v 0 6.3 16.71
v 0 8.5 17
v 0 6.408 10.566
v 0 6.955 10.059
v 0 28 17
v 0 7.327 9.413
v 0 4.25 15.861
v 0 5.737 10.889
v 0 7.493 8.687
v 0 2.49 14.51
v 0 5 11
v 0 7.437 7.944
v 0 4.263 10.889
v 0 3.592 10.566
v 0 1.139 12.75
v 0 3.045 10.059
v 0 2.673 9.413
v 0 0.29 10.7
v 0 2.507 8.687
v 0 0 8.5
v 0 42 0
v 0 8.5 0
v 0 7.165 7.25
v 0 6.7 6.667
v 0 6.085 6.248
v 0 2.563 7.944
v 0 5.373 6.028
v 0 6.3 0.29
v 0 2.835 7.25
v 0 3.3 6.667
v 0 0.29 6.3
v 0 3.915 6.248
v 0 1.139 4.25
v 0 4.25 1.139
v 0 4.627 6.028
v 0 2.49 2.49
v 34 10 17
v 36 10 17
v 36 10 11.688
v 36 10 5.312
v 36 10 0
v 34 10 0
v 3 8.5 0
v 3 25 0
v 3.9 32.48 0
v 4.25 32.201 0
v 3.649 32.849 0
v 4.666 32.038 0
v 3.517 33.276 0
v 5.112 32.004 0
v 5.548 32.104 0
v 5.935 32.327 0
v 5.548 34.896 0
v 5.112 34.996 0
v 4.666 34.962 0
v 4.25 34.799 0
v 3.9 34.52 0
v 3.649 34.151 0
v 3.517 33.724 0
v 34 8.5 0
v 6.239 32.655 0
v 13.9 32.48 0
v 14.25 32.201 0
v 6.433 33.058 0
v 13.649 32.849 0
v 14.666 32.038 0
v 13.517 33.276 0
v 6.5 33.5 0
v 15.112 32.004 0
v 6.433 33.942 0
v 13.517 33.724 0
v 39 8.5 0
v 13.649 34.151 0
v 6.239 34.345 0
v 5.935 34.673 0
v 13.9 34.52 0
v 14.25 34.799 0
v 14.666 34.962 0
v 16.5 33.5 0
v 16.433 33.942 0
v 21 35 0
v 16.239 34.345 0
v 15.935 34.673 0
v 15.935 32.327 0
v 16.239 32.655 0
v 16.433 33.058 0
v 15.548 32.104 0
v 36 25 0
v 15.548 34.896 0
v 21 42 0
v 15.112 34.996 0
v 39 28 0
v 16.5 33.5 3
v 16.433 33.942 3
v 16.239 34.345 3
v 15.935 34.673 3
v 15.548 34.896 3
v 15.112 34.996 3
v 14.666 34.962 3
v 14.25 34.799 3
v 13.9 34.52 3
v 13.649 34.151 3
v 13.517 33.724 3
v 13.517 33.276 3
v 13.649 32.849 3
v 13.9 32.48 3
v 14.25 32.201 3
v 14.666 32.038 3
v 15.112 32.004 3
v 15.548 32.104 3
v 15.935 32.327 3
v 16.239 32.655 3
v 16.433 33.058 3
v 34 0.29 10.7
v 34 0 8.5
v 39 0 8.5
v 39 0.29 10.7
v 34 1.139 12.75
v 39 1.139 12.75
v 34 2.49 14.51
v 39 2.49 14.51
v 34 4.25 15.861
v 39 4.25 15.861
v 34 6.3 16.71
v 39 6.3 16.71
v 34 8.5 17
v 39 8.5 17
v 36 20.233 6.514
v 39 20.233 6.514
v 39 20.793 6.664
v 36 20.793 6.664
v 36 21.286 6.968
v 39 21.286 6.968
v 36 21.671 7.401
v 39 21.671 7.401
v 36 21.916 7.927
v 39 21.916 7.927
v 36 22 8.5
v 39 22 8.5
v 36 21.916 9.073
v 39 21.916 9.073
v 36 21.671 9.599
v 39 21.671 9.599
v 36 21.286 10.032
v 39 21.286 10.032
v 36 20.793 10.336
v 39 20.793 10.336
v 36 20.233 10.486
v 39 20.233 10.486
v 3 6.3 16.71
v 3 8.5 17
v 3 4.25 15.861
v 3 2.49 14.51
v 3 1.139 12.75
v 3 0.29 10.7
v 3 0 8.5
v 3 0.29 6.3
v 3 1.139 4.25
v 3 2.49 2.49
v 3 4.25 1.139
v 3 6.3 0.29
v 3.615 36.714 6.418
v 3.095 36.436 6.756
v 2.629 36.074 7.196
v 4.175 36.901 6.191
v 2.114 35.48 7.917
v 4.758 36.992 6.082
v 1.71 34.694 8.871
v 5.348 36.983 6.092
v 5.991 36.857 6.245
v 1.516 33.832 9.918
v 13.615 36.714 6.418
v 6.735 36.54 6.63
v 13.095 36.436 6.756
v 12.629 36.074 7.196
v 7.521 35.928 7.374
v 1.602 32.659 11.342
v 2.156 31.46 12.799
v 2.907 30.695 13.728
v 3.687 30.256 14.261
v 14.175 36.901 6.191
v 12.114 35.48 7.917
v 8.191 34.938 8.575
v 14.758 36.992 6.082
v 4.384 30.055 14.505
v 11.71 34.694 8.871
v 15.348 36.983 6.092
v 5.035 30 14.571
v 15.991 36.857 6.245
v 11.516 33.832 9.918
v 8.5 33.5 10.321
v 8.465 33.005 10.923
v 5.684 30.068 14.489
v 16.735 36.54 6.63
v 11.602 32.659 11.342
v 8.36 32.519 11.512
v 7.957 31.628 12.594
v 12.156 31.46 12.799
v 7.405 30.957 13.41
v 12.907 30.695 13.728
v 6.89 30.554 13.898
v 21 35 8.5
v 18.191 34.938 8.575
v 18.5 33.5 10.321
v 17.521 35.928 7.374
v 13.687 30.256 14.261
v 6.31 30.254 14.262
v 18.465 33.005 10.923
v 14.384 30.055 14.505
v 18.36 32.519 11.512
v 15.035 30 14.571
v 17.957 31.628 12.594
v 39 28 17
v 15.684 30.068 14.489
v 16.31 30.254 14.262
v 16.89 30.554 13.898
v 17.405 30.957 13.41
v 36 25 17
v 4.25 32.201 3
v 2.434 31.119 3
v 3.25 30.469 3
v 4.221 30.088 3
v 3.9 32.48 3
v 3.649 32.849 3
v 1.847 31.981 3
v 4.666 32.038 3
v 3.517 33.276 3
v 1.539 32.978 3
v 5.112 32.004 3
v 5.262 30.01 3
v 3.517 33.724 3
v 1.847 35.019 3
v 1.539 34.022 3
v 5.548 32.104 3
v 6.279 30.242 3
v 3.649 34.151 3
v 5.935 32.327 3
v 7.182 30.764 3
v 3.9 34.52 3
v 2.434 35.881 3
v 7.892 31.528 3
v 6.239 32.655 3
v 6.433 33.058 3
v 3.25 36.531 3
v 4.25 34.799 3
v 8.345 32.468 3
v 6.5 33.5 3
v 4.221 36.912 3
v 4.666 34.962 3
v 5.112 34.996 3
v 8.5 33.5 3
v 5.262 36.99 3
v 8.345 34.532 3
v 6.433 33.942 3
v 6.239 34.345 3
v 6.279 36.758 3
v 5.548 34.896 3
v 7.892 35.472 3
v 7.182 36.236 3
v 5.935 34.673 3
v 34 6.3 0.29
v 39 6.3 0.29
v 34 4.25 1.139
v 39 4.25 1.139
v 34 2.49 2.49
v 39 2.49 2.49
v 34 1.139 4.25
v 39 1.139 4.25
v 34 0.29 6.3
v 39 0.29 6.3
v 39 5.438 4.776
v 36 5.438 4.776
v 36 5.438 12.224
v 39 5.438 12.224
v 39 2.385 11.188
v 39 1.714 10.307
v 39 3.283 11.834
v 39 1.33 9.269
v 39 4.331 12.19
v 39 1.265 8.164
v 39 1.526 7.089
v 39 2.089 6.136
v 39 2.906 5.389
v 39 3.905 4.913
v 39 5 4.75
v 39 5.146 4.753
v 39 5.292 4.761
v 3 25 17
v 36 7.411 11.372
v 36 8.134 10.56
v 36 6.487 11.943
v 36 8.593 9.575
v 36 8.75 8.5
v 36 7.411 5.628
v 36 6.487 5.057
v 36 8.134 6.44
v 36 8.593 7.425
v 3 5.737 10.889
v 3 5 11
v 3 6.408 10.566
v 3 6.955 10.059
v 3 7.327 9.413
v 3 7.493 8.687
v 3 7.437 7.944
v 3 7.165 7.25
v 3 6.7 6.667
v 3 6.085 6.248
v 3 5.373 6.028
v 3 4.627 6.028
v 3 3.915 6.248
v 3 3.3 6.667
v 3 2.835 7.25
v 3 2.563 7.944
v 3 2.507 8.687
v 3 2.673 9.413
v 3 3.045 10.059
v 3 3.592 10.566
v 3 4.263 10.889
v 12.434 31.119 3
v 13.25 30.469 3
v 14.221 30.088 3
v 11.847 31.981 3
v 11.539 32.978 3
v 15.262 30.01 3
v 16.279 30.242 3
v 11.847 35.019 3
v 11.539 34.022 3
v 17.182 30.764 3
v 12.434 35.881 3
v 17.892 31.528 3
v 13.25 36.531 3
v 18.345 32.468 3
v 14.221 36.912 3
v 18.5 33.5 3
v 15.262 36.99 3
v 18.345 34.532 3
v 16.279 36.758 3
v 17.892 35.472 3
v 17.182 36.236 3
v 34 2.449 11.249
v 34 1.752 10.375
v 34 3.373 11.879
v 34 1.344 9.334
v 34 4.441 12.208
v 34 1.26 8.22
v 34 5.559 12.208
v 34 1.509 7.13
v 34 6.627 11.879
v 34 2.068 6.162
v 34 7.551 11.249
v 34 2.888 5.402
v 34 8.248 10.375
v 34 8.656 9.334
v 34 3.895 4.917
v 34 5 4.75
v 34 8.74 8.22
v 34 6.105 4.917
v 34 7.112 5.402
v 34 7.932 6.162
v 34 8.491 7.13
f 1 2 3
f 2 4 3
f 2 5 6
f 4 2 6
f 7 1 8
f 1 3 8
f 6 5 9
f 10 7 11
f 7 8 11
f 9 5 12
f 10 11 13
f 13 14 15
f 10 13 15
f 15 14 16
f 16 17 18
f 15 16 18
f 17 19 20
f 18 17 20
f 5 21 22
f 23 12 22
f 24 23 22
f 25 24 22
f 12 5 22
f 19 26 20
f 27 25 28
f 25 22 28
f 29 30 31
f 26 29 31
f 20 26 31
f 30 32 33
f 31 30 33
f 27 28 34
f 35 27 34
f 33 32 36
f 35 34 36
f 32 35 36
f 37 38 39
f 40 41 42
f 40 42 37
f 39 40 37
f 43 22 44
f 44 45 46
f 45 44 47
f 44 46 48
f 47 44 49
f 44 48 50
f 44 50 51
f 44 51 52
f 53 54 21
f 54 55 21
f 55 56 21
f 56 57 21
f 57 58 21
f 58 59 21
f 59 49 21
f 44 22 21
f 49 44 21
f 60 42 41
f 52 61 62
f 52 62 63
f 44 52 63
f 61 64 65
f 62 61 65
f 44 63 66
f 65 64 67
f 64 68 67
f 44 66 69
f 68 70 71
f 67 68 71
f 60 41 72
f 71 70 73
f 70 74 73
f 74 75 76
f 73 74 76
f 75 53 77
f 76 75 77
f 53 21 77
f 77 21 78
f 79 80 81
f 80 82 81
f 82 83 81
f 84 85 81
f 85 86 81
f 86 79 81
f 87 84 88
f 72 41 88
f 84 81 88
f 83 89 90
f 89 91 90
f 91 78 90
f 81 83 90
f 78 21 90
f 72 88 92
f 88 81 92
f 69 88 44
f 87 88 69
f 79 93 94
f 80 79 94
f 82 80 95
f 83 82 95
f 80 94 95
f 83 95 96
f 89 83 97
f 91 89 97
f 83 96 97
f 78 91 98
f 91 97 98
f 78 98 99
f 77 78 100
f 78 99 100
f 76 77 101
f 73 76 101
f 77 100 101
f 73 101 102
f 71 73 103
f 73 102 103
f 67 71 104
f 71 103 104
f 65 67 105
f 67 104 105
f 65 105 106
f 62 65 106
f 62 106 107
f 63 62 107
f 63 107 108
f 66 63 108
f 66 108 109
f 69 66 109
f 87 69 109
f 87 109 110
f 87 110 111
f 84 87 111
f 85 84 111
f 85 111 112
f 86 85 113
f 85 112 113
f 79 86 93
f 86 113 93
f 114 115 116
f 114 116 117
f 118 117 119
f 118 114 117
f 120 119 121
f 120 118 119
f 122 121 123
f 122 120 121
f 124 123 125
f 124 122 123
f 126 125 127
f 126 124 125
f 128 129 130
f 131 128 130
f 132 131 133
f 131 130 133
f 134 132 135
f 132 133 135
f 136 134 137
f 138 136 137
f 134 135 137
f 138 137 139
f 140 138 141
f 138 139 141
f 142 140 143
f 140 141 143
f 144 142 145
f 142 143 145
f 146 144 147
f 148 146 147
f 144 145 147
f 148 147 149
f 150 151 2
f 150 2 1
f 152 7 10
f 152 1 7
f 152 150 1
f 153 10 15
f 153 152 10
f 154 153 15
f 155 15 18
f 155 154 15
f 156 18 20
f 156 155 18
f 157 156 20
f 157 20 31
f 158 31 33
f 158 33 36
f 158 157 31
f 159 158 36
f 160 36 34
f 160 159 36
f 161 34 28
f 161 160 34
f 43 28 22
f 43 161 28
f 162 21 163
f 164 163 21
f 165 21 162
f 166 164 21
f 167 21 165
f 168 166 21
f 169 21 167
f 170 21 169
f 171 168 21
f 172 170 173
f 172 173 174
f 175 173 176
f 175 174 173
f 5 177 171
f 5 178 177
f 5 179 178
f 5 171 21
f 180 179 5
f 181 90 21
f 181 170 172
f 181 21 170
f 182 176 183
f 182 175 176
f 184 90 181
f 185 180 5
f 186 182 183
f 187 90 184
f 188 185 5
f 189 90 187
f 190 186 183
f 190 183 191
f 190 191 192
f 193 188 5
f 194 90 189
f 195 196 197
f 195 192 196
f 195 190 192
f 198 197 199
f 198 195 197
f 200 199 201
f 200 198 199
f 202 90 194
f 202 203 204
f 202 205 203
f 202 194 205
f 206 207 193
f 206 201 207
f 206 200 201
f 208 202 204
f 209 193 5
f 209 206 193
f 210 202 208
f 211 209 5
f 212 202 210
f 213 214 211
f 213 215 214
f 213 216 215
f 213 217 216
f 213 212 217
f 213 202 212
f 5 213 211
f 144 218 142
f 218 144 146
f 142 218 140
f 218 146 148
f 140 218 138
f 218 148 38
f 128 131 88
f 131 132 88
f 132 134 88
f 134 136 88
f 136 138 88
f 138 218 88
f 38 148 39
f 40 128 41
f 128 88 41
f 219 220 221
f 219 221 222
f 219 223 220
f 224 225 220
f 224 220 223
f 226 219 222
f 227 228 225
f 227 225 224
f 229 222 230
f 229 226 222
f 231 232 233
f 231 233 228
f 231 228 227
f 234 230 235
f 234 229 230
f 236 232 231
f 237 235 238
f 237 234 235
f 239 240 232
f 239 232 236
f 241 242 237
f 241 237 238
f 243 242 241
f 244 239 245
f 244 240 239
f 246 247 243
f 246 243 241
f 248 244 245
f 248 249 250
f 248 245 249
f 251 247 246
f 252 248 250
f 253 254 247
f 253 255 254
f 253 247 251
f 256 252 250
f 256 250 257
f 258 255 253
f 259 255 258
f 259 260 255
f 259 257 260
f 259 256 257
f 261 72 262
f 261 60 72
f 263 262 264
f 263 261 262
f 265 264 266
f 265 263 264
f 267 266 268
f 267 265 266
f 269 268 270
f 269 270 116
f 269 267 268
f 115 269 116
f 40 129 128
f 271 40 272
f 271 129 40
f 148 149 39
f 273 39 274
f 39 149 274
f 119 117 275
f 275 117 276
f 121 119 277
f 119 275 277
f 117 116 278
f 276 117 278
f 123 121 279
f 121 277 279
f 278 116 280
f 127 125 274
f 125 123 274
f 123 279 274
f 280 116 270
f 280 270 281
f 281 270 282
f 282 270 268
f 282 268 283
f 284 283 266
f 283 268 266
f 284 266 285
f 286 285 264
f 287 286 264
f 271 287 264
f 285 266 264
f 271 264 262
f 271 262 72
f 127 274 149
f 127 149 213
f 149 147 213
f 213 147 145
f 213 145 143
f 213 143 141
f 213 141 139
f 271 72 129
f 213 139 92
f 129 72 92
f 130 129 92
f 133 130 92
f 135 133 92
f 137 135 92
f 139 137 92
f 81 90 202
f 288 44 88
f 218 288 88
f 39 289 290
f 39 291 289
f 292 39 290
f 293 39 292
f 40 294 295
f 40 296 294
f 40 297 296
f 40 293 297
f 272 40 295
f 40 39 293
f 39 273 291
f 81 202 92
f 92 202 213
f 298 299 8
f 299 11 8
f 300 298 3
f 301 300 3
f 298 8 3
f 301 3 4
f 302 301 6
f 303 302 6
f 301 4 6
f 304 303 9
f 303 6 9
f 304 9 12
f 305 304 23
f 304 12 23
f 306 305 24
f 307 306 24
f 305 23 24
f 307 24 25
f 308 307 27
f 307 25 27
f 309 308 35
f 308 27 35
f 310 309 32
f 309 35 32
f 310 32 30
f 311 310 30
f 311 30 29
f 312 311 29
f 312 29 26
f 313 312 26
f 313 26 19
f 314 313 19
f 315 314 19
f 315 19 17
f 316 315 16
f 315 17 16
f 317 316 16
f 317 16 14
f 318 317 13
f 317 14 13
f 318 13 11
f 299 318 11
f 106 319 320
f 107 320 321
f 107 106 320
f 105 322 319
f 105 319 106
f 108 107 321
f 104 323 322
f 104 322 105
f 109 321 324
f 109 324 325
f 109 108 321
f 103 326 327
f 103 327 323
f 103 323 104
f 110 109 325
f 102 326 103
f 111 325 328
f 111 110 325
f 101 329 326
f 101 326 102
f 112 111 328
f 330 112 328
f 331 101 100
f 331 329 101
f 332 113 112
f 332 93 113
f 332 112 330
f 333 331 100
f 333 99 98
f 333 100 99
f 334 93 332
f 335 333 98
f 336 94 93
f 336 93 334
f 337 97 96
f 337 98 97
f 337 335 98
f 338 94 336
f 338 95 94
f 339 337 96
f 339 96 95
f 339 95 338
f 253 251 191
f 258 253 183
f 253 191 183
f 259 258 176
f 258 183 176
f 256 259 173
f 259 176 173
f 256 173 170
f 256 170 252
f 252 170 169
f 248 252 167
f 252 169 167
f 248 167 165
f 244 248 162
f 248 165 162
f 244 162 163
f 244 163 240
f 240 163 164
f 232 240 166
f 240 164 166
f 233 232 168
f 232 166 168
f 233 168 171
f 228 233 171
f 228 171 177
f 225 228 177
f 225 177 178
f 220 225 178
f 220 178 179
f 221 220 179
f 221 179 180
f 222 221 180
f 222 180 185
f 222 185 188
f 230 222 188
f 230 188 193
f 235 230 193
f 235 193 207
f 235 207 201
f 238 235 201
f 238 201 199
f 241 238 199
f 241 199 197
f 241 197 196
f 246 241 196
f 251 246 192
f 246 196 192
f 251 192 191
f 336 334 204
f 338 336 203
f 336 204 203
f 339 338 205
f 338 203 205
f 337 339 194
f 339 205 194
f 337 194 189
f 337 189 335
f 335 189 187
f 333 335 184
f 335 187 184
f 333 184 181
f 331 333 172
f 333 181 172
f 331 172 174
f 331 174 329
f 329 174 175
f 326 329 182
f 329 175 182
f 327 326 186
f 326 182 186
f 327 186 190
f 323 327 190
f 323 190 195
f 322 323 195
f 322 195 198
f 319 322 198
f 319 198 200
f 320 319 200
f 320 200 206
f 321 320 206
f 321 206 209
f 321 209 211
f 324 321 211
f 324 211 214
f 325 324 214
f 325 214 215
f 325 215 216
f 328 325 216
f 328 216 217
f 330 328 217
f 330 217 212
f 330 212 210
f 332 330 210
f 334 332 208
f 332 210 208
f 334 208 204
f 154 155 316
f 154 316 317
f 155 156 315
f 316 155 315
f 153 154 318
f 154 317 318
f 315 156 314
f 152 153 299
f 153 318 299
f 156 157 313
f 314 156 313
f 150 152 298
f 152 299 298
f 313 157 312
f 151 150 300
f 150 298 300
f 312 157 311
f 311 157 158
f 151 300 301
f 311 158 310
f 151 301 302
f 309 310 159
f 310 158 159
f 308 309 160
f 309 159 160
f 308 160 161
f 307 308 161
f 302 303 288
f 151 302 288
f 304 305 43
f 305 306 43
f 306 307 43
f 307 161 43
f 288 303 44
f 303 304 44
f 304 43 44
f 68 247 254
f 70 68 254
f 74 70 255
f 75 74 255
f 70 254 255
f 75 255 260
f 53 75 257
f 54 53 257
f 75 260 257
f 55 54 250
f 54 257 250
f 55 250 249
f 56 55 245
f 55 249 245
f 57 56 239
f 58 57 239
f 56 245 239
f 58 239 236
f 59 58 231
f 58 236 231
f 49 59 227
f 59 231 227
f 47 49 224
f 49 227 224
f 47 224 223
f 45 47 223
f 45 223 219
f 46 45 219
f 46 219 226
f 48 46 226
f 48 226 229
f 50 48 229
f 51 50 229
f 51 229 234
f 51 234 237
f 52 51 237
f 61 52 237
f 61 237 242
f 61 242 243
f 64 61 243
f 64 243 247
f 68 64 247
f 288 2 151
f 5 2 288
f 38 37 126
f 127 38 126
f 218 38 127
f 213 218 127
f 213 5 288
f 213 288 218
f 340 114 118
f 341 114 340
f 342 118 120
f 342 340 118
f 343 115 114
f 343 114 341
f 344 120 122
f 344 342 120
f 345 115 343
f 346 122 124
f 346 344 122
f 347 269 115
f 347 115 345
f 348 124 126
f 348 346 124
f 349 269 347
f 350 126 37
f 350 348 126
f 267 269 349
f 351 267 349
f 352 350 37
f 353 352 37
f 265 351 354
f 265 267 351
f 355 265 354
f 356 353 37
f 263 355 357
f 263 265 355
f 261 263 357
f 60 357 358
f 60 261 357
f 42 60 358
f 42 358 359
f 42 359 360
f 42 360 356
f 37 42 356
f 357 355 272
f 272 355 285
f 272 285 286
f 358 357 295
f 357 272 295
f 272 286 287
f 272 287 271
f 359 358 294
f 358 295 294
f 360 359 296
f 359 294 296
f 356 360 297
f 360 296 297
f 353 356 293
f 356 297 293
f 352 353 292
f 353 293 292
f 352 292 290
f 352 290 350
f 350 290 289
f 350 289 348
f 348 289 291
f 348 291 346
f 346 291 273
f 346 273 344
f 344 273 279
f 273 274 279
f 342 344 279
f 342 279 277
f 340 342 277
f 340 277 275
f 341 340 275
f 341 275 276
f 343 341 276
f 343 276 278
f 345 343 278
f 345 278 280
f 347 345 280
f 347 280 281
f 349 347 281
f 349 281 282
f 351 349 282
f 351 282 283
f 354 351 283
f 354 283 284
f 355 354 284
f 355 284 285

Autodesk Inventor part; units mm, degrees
ref_plane "YZ Plane" through (0, 0, 0) normal (1, 0, 0) x (0, 1, 0)
ref_plane "XZ Plane" through (0, 0, 0) normal (0, 1, 0) x (-1, 0, 0)
ref_plane "XY Plane" through (0, 0, 0) normal (0, 0, 1) x (1, 0, 0)
sketch "Sketch1" plane through (0, 0, 0) normal (0, 0, 1) x (1, 0, 0)
  line L0 (0, 0) -> (3, 0)
  line L1 (3, 0) -> (3, 25)
  line L2 (3, 25) -> (0, 25)
  line L3 (0, 25) -> (0, 0)
  line L4 (34, 25) -> (39, 25)
  line L5 (39, 25) -> (39, 0)
  line L6 (39, 0) -> (34, 0)
  line L7 (34, 0) -> (34, 25)
  line L8 (0, 25) -> (39, 25)
  line L9 (39, 25) -> (39, 42)
  line L10 (39, 42) -> (0, 42)
  line L11 (0, 42) -> (0, 25)
  line L12 (34, 25) -> (36, 25)
  line L13 (36, 25) -> (36, 10)
  line L14 (36, 10) -> (34, 10)
  line L15 (34, 10) -> (34, 25)
  point P0 (3, 25)
  point P1 (34, 25)
  dimension "d0" = 3
  dimension "d1" = 25
  dimension "d2" = 5
  dimension "d3" = 25
  dimension "d4" = 31
  dimension "d5" = 39
  dimension "d6" = 17
  dimension "d70" = 2
  dimension "d71" = 15
extrude "Extrusion1" add sketch "Sketch1" along normal blind 17 contours L3 L2 L1 L0 | L11 L10 L9 L4 L8 L2 | L4 L5 L6 L7 L14 L13
sketch "Sketch2" plane through (39, 0, 0) normal (1, 0, 0) x (0, 0, -1)
  line L0 (-17, 28) -> (-17, 42)
  line L1 (0, 42) -> (-17, 42) projected
  line L2 (-17, 42) -> (0, 42)
  line L3 (0, 42) -> (-17, 28)
  point P0 (0, 0)
  dimension "d9" = 14
extrude "Extrusion2" cut sketch "Sketch2" against normal up to surface (39 mm away)
sketch "Sketch4" plane through (0, 0, 17) normal (0, 0, 1) x (1, 0, 0)
  line L0 (39, 0) -> (39, 42) projected
  line L1 (20, 42) -> (0, 42)
  line L2 (0, 42) -> (0, 25)
  line L3 (0, 25) -> (20, 25)
  line L4 (20, 25) -> (20, 42)
  circle A0 centre (15, 33.5) radius 3.5
  circle A1 centre (5, 33.5) radius 3.5
  line L5 (3, 25) -> (34, 25) projected
  line L6 (3, 25) -> (1, 25)
  point P0 (0, 0)
  dimension "d17" = 17
  dimension "d18" = 7
  dimension "d19" = 7
  dimension "d20" = 8.5
  dimension "d22" = 8.5
  dimension "d23" = 5
  dimension "d48" = 5
  dimension "d49" = 20
extrude "Extrusion4" cut sketch "Sketch4" against normal blind 14 contours A0 | A1
sketch "Sketch5" plane through (0, 0, 3) normal (0, 0, 1) x (1, 0, 0)
  arc A0 (15, 37) -> (15, 37) centre (15, 33.5) ccw projected
  circle A1 centre (15, 33.5) radius 1.5
  circle A2 centre (5, 33.5) radius 3.5 projected
  circle A3 centre (5, 33.5) radius 1.5
  point P0 (0, 0)
  point P1 (32.4191, 39.5294)
  point P2 (27.5809, 39.5294)
  point P3 (22.4191, 39.5294)
  point P4 (17.5809, 39.5294)
  dimension "d26" = 3
  dimension "d27" = 3
extrude "Extrusion5" cut sketch "Sketch5" against normal up to surface (3 mm away) contours A1 | A3
sketch "Sketch10" plane through (0, 0, 17) normal (0, 0, 1) x (1, 0, 0)
  line L0 (39, 42) -> (0, 42) projected
  line L1 (39, 42) -> (21, 42)
  line L2 (21, 42) -> (21, 35)
  line L3 (39, 28) -> (0, 28) projected
  line L4 (21, 35) -> (39, 28)
  line L5 (39, 42) -> (39, 28) projected
  line L6 (39, 28) -> (39, 42)
  point P0 (0, 0)
  dimension "d50" = 18
  dimension "d51" = 7
extrude "Extrusion10" cut sketch "Sketch10" against normal up to surface (17 mm away)
sketch "Sketch11" plane through (39, 0, 17) normal (1, 0, 0) x (0, 0, -1)
  circle A0 centre (8.5, 5) radius 3.75
  line L0 (17, 0) -> (0, 0) projected
  line L1 (17, 0) -> (17, 28) projected
  dimension "d54" = 7.5
  dimension "d55" = 5
  dimension "d56" = 8.5
extrude "Extrusion11" cut sketch "Sketch11" against normal up to surface (5 mm away)
sketch "Sketch12" plane through (0, 0, 0) normal (-1, 0, 0) x (0, 0, 1)
  circle A0 centre (8.5, 5) radius 2.5
  line L0 (0, 0) -> (17, 0) projected
  line L1 (17, 28) -> (17, 0) projected
  dimension "d59" = 5
  dimension "d60" = 5
  dimension "d61" = 8.5
extrude "Extrusion12" cut sketch "Sketch12" against normal up to surface (3 mm away)
fillet "Fillet2" radius 8.5 4 edges at (1.5, 0, 17) (1.5, 0, 0) (36.5, 0, 17) (36.5, 0, 0)
sketch "Sketch13" plane through (39, 28, 17) normal (1, 0, 0) x (0, 0, -1)
  circle A0 centre (8.5, -23) radius 3.75 projected
  circle A1 centre (8.5, -23) radius 3.5
  circle A2 centre (8.5, -8) radius 2
  circle A3 centre (8.5, -23) radius 3.75
  line L0 (10.4863, -7.7667) -> (12.2244, -22.5625)
  line L1 (6.5137, -7.7667) -> (4.7756, -22.5625)
  point P0 (17, -28)
  dimension "d65" = 4
  dimension "d66" = 15
  dimension "d67" = 0
extrude "Extrusion13" cut sketch "Sketch13" against normal blind 3 contours A0 | A0 L1 A2 L0 | A2 | A1
properties part number "juncao8"
